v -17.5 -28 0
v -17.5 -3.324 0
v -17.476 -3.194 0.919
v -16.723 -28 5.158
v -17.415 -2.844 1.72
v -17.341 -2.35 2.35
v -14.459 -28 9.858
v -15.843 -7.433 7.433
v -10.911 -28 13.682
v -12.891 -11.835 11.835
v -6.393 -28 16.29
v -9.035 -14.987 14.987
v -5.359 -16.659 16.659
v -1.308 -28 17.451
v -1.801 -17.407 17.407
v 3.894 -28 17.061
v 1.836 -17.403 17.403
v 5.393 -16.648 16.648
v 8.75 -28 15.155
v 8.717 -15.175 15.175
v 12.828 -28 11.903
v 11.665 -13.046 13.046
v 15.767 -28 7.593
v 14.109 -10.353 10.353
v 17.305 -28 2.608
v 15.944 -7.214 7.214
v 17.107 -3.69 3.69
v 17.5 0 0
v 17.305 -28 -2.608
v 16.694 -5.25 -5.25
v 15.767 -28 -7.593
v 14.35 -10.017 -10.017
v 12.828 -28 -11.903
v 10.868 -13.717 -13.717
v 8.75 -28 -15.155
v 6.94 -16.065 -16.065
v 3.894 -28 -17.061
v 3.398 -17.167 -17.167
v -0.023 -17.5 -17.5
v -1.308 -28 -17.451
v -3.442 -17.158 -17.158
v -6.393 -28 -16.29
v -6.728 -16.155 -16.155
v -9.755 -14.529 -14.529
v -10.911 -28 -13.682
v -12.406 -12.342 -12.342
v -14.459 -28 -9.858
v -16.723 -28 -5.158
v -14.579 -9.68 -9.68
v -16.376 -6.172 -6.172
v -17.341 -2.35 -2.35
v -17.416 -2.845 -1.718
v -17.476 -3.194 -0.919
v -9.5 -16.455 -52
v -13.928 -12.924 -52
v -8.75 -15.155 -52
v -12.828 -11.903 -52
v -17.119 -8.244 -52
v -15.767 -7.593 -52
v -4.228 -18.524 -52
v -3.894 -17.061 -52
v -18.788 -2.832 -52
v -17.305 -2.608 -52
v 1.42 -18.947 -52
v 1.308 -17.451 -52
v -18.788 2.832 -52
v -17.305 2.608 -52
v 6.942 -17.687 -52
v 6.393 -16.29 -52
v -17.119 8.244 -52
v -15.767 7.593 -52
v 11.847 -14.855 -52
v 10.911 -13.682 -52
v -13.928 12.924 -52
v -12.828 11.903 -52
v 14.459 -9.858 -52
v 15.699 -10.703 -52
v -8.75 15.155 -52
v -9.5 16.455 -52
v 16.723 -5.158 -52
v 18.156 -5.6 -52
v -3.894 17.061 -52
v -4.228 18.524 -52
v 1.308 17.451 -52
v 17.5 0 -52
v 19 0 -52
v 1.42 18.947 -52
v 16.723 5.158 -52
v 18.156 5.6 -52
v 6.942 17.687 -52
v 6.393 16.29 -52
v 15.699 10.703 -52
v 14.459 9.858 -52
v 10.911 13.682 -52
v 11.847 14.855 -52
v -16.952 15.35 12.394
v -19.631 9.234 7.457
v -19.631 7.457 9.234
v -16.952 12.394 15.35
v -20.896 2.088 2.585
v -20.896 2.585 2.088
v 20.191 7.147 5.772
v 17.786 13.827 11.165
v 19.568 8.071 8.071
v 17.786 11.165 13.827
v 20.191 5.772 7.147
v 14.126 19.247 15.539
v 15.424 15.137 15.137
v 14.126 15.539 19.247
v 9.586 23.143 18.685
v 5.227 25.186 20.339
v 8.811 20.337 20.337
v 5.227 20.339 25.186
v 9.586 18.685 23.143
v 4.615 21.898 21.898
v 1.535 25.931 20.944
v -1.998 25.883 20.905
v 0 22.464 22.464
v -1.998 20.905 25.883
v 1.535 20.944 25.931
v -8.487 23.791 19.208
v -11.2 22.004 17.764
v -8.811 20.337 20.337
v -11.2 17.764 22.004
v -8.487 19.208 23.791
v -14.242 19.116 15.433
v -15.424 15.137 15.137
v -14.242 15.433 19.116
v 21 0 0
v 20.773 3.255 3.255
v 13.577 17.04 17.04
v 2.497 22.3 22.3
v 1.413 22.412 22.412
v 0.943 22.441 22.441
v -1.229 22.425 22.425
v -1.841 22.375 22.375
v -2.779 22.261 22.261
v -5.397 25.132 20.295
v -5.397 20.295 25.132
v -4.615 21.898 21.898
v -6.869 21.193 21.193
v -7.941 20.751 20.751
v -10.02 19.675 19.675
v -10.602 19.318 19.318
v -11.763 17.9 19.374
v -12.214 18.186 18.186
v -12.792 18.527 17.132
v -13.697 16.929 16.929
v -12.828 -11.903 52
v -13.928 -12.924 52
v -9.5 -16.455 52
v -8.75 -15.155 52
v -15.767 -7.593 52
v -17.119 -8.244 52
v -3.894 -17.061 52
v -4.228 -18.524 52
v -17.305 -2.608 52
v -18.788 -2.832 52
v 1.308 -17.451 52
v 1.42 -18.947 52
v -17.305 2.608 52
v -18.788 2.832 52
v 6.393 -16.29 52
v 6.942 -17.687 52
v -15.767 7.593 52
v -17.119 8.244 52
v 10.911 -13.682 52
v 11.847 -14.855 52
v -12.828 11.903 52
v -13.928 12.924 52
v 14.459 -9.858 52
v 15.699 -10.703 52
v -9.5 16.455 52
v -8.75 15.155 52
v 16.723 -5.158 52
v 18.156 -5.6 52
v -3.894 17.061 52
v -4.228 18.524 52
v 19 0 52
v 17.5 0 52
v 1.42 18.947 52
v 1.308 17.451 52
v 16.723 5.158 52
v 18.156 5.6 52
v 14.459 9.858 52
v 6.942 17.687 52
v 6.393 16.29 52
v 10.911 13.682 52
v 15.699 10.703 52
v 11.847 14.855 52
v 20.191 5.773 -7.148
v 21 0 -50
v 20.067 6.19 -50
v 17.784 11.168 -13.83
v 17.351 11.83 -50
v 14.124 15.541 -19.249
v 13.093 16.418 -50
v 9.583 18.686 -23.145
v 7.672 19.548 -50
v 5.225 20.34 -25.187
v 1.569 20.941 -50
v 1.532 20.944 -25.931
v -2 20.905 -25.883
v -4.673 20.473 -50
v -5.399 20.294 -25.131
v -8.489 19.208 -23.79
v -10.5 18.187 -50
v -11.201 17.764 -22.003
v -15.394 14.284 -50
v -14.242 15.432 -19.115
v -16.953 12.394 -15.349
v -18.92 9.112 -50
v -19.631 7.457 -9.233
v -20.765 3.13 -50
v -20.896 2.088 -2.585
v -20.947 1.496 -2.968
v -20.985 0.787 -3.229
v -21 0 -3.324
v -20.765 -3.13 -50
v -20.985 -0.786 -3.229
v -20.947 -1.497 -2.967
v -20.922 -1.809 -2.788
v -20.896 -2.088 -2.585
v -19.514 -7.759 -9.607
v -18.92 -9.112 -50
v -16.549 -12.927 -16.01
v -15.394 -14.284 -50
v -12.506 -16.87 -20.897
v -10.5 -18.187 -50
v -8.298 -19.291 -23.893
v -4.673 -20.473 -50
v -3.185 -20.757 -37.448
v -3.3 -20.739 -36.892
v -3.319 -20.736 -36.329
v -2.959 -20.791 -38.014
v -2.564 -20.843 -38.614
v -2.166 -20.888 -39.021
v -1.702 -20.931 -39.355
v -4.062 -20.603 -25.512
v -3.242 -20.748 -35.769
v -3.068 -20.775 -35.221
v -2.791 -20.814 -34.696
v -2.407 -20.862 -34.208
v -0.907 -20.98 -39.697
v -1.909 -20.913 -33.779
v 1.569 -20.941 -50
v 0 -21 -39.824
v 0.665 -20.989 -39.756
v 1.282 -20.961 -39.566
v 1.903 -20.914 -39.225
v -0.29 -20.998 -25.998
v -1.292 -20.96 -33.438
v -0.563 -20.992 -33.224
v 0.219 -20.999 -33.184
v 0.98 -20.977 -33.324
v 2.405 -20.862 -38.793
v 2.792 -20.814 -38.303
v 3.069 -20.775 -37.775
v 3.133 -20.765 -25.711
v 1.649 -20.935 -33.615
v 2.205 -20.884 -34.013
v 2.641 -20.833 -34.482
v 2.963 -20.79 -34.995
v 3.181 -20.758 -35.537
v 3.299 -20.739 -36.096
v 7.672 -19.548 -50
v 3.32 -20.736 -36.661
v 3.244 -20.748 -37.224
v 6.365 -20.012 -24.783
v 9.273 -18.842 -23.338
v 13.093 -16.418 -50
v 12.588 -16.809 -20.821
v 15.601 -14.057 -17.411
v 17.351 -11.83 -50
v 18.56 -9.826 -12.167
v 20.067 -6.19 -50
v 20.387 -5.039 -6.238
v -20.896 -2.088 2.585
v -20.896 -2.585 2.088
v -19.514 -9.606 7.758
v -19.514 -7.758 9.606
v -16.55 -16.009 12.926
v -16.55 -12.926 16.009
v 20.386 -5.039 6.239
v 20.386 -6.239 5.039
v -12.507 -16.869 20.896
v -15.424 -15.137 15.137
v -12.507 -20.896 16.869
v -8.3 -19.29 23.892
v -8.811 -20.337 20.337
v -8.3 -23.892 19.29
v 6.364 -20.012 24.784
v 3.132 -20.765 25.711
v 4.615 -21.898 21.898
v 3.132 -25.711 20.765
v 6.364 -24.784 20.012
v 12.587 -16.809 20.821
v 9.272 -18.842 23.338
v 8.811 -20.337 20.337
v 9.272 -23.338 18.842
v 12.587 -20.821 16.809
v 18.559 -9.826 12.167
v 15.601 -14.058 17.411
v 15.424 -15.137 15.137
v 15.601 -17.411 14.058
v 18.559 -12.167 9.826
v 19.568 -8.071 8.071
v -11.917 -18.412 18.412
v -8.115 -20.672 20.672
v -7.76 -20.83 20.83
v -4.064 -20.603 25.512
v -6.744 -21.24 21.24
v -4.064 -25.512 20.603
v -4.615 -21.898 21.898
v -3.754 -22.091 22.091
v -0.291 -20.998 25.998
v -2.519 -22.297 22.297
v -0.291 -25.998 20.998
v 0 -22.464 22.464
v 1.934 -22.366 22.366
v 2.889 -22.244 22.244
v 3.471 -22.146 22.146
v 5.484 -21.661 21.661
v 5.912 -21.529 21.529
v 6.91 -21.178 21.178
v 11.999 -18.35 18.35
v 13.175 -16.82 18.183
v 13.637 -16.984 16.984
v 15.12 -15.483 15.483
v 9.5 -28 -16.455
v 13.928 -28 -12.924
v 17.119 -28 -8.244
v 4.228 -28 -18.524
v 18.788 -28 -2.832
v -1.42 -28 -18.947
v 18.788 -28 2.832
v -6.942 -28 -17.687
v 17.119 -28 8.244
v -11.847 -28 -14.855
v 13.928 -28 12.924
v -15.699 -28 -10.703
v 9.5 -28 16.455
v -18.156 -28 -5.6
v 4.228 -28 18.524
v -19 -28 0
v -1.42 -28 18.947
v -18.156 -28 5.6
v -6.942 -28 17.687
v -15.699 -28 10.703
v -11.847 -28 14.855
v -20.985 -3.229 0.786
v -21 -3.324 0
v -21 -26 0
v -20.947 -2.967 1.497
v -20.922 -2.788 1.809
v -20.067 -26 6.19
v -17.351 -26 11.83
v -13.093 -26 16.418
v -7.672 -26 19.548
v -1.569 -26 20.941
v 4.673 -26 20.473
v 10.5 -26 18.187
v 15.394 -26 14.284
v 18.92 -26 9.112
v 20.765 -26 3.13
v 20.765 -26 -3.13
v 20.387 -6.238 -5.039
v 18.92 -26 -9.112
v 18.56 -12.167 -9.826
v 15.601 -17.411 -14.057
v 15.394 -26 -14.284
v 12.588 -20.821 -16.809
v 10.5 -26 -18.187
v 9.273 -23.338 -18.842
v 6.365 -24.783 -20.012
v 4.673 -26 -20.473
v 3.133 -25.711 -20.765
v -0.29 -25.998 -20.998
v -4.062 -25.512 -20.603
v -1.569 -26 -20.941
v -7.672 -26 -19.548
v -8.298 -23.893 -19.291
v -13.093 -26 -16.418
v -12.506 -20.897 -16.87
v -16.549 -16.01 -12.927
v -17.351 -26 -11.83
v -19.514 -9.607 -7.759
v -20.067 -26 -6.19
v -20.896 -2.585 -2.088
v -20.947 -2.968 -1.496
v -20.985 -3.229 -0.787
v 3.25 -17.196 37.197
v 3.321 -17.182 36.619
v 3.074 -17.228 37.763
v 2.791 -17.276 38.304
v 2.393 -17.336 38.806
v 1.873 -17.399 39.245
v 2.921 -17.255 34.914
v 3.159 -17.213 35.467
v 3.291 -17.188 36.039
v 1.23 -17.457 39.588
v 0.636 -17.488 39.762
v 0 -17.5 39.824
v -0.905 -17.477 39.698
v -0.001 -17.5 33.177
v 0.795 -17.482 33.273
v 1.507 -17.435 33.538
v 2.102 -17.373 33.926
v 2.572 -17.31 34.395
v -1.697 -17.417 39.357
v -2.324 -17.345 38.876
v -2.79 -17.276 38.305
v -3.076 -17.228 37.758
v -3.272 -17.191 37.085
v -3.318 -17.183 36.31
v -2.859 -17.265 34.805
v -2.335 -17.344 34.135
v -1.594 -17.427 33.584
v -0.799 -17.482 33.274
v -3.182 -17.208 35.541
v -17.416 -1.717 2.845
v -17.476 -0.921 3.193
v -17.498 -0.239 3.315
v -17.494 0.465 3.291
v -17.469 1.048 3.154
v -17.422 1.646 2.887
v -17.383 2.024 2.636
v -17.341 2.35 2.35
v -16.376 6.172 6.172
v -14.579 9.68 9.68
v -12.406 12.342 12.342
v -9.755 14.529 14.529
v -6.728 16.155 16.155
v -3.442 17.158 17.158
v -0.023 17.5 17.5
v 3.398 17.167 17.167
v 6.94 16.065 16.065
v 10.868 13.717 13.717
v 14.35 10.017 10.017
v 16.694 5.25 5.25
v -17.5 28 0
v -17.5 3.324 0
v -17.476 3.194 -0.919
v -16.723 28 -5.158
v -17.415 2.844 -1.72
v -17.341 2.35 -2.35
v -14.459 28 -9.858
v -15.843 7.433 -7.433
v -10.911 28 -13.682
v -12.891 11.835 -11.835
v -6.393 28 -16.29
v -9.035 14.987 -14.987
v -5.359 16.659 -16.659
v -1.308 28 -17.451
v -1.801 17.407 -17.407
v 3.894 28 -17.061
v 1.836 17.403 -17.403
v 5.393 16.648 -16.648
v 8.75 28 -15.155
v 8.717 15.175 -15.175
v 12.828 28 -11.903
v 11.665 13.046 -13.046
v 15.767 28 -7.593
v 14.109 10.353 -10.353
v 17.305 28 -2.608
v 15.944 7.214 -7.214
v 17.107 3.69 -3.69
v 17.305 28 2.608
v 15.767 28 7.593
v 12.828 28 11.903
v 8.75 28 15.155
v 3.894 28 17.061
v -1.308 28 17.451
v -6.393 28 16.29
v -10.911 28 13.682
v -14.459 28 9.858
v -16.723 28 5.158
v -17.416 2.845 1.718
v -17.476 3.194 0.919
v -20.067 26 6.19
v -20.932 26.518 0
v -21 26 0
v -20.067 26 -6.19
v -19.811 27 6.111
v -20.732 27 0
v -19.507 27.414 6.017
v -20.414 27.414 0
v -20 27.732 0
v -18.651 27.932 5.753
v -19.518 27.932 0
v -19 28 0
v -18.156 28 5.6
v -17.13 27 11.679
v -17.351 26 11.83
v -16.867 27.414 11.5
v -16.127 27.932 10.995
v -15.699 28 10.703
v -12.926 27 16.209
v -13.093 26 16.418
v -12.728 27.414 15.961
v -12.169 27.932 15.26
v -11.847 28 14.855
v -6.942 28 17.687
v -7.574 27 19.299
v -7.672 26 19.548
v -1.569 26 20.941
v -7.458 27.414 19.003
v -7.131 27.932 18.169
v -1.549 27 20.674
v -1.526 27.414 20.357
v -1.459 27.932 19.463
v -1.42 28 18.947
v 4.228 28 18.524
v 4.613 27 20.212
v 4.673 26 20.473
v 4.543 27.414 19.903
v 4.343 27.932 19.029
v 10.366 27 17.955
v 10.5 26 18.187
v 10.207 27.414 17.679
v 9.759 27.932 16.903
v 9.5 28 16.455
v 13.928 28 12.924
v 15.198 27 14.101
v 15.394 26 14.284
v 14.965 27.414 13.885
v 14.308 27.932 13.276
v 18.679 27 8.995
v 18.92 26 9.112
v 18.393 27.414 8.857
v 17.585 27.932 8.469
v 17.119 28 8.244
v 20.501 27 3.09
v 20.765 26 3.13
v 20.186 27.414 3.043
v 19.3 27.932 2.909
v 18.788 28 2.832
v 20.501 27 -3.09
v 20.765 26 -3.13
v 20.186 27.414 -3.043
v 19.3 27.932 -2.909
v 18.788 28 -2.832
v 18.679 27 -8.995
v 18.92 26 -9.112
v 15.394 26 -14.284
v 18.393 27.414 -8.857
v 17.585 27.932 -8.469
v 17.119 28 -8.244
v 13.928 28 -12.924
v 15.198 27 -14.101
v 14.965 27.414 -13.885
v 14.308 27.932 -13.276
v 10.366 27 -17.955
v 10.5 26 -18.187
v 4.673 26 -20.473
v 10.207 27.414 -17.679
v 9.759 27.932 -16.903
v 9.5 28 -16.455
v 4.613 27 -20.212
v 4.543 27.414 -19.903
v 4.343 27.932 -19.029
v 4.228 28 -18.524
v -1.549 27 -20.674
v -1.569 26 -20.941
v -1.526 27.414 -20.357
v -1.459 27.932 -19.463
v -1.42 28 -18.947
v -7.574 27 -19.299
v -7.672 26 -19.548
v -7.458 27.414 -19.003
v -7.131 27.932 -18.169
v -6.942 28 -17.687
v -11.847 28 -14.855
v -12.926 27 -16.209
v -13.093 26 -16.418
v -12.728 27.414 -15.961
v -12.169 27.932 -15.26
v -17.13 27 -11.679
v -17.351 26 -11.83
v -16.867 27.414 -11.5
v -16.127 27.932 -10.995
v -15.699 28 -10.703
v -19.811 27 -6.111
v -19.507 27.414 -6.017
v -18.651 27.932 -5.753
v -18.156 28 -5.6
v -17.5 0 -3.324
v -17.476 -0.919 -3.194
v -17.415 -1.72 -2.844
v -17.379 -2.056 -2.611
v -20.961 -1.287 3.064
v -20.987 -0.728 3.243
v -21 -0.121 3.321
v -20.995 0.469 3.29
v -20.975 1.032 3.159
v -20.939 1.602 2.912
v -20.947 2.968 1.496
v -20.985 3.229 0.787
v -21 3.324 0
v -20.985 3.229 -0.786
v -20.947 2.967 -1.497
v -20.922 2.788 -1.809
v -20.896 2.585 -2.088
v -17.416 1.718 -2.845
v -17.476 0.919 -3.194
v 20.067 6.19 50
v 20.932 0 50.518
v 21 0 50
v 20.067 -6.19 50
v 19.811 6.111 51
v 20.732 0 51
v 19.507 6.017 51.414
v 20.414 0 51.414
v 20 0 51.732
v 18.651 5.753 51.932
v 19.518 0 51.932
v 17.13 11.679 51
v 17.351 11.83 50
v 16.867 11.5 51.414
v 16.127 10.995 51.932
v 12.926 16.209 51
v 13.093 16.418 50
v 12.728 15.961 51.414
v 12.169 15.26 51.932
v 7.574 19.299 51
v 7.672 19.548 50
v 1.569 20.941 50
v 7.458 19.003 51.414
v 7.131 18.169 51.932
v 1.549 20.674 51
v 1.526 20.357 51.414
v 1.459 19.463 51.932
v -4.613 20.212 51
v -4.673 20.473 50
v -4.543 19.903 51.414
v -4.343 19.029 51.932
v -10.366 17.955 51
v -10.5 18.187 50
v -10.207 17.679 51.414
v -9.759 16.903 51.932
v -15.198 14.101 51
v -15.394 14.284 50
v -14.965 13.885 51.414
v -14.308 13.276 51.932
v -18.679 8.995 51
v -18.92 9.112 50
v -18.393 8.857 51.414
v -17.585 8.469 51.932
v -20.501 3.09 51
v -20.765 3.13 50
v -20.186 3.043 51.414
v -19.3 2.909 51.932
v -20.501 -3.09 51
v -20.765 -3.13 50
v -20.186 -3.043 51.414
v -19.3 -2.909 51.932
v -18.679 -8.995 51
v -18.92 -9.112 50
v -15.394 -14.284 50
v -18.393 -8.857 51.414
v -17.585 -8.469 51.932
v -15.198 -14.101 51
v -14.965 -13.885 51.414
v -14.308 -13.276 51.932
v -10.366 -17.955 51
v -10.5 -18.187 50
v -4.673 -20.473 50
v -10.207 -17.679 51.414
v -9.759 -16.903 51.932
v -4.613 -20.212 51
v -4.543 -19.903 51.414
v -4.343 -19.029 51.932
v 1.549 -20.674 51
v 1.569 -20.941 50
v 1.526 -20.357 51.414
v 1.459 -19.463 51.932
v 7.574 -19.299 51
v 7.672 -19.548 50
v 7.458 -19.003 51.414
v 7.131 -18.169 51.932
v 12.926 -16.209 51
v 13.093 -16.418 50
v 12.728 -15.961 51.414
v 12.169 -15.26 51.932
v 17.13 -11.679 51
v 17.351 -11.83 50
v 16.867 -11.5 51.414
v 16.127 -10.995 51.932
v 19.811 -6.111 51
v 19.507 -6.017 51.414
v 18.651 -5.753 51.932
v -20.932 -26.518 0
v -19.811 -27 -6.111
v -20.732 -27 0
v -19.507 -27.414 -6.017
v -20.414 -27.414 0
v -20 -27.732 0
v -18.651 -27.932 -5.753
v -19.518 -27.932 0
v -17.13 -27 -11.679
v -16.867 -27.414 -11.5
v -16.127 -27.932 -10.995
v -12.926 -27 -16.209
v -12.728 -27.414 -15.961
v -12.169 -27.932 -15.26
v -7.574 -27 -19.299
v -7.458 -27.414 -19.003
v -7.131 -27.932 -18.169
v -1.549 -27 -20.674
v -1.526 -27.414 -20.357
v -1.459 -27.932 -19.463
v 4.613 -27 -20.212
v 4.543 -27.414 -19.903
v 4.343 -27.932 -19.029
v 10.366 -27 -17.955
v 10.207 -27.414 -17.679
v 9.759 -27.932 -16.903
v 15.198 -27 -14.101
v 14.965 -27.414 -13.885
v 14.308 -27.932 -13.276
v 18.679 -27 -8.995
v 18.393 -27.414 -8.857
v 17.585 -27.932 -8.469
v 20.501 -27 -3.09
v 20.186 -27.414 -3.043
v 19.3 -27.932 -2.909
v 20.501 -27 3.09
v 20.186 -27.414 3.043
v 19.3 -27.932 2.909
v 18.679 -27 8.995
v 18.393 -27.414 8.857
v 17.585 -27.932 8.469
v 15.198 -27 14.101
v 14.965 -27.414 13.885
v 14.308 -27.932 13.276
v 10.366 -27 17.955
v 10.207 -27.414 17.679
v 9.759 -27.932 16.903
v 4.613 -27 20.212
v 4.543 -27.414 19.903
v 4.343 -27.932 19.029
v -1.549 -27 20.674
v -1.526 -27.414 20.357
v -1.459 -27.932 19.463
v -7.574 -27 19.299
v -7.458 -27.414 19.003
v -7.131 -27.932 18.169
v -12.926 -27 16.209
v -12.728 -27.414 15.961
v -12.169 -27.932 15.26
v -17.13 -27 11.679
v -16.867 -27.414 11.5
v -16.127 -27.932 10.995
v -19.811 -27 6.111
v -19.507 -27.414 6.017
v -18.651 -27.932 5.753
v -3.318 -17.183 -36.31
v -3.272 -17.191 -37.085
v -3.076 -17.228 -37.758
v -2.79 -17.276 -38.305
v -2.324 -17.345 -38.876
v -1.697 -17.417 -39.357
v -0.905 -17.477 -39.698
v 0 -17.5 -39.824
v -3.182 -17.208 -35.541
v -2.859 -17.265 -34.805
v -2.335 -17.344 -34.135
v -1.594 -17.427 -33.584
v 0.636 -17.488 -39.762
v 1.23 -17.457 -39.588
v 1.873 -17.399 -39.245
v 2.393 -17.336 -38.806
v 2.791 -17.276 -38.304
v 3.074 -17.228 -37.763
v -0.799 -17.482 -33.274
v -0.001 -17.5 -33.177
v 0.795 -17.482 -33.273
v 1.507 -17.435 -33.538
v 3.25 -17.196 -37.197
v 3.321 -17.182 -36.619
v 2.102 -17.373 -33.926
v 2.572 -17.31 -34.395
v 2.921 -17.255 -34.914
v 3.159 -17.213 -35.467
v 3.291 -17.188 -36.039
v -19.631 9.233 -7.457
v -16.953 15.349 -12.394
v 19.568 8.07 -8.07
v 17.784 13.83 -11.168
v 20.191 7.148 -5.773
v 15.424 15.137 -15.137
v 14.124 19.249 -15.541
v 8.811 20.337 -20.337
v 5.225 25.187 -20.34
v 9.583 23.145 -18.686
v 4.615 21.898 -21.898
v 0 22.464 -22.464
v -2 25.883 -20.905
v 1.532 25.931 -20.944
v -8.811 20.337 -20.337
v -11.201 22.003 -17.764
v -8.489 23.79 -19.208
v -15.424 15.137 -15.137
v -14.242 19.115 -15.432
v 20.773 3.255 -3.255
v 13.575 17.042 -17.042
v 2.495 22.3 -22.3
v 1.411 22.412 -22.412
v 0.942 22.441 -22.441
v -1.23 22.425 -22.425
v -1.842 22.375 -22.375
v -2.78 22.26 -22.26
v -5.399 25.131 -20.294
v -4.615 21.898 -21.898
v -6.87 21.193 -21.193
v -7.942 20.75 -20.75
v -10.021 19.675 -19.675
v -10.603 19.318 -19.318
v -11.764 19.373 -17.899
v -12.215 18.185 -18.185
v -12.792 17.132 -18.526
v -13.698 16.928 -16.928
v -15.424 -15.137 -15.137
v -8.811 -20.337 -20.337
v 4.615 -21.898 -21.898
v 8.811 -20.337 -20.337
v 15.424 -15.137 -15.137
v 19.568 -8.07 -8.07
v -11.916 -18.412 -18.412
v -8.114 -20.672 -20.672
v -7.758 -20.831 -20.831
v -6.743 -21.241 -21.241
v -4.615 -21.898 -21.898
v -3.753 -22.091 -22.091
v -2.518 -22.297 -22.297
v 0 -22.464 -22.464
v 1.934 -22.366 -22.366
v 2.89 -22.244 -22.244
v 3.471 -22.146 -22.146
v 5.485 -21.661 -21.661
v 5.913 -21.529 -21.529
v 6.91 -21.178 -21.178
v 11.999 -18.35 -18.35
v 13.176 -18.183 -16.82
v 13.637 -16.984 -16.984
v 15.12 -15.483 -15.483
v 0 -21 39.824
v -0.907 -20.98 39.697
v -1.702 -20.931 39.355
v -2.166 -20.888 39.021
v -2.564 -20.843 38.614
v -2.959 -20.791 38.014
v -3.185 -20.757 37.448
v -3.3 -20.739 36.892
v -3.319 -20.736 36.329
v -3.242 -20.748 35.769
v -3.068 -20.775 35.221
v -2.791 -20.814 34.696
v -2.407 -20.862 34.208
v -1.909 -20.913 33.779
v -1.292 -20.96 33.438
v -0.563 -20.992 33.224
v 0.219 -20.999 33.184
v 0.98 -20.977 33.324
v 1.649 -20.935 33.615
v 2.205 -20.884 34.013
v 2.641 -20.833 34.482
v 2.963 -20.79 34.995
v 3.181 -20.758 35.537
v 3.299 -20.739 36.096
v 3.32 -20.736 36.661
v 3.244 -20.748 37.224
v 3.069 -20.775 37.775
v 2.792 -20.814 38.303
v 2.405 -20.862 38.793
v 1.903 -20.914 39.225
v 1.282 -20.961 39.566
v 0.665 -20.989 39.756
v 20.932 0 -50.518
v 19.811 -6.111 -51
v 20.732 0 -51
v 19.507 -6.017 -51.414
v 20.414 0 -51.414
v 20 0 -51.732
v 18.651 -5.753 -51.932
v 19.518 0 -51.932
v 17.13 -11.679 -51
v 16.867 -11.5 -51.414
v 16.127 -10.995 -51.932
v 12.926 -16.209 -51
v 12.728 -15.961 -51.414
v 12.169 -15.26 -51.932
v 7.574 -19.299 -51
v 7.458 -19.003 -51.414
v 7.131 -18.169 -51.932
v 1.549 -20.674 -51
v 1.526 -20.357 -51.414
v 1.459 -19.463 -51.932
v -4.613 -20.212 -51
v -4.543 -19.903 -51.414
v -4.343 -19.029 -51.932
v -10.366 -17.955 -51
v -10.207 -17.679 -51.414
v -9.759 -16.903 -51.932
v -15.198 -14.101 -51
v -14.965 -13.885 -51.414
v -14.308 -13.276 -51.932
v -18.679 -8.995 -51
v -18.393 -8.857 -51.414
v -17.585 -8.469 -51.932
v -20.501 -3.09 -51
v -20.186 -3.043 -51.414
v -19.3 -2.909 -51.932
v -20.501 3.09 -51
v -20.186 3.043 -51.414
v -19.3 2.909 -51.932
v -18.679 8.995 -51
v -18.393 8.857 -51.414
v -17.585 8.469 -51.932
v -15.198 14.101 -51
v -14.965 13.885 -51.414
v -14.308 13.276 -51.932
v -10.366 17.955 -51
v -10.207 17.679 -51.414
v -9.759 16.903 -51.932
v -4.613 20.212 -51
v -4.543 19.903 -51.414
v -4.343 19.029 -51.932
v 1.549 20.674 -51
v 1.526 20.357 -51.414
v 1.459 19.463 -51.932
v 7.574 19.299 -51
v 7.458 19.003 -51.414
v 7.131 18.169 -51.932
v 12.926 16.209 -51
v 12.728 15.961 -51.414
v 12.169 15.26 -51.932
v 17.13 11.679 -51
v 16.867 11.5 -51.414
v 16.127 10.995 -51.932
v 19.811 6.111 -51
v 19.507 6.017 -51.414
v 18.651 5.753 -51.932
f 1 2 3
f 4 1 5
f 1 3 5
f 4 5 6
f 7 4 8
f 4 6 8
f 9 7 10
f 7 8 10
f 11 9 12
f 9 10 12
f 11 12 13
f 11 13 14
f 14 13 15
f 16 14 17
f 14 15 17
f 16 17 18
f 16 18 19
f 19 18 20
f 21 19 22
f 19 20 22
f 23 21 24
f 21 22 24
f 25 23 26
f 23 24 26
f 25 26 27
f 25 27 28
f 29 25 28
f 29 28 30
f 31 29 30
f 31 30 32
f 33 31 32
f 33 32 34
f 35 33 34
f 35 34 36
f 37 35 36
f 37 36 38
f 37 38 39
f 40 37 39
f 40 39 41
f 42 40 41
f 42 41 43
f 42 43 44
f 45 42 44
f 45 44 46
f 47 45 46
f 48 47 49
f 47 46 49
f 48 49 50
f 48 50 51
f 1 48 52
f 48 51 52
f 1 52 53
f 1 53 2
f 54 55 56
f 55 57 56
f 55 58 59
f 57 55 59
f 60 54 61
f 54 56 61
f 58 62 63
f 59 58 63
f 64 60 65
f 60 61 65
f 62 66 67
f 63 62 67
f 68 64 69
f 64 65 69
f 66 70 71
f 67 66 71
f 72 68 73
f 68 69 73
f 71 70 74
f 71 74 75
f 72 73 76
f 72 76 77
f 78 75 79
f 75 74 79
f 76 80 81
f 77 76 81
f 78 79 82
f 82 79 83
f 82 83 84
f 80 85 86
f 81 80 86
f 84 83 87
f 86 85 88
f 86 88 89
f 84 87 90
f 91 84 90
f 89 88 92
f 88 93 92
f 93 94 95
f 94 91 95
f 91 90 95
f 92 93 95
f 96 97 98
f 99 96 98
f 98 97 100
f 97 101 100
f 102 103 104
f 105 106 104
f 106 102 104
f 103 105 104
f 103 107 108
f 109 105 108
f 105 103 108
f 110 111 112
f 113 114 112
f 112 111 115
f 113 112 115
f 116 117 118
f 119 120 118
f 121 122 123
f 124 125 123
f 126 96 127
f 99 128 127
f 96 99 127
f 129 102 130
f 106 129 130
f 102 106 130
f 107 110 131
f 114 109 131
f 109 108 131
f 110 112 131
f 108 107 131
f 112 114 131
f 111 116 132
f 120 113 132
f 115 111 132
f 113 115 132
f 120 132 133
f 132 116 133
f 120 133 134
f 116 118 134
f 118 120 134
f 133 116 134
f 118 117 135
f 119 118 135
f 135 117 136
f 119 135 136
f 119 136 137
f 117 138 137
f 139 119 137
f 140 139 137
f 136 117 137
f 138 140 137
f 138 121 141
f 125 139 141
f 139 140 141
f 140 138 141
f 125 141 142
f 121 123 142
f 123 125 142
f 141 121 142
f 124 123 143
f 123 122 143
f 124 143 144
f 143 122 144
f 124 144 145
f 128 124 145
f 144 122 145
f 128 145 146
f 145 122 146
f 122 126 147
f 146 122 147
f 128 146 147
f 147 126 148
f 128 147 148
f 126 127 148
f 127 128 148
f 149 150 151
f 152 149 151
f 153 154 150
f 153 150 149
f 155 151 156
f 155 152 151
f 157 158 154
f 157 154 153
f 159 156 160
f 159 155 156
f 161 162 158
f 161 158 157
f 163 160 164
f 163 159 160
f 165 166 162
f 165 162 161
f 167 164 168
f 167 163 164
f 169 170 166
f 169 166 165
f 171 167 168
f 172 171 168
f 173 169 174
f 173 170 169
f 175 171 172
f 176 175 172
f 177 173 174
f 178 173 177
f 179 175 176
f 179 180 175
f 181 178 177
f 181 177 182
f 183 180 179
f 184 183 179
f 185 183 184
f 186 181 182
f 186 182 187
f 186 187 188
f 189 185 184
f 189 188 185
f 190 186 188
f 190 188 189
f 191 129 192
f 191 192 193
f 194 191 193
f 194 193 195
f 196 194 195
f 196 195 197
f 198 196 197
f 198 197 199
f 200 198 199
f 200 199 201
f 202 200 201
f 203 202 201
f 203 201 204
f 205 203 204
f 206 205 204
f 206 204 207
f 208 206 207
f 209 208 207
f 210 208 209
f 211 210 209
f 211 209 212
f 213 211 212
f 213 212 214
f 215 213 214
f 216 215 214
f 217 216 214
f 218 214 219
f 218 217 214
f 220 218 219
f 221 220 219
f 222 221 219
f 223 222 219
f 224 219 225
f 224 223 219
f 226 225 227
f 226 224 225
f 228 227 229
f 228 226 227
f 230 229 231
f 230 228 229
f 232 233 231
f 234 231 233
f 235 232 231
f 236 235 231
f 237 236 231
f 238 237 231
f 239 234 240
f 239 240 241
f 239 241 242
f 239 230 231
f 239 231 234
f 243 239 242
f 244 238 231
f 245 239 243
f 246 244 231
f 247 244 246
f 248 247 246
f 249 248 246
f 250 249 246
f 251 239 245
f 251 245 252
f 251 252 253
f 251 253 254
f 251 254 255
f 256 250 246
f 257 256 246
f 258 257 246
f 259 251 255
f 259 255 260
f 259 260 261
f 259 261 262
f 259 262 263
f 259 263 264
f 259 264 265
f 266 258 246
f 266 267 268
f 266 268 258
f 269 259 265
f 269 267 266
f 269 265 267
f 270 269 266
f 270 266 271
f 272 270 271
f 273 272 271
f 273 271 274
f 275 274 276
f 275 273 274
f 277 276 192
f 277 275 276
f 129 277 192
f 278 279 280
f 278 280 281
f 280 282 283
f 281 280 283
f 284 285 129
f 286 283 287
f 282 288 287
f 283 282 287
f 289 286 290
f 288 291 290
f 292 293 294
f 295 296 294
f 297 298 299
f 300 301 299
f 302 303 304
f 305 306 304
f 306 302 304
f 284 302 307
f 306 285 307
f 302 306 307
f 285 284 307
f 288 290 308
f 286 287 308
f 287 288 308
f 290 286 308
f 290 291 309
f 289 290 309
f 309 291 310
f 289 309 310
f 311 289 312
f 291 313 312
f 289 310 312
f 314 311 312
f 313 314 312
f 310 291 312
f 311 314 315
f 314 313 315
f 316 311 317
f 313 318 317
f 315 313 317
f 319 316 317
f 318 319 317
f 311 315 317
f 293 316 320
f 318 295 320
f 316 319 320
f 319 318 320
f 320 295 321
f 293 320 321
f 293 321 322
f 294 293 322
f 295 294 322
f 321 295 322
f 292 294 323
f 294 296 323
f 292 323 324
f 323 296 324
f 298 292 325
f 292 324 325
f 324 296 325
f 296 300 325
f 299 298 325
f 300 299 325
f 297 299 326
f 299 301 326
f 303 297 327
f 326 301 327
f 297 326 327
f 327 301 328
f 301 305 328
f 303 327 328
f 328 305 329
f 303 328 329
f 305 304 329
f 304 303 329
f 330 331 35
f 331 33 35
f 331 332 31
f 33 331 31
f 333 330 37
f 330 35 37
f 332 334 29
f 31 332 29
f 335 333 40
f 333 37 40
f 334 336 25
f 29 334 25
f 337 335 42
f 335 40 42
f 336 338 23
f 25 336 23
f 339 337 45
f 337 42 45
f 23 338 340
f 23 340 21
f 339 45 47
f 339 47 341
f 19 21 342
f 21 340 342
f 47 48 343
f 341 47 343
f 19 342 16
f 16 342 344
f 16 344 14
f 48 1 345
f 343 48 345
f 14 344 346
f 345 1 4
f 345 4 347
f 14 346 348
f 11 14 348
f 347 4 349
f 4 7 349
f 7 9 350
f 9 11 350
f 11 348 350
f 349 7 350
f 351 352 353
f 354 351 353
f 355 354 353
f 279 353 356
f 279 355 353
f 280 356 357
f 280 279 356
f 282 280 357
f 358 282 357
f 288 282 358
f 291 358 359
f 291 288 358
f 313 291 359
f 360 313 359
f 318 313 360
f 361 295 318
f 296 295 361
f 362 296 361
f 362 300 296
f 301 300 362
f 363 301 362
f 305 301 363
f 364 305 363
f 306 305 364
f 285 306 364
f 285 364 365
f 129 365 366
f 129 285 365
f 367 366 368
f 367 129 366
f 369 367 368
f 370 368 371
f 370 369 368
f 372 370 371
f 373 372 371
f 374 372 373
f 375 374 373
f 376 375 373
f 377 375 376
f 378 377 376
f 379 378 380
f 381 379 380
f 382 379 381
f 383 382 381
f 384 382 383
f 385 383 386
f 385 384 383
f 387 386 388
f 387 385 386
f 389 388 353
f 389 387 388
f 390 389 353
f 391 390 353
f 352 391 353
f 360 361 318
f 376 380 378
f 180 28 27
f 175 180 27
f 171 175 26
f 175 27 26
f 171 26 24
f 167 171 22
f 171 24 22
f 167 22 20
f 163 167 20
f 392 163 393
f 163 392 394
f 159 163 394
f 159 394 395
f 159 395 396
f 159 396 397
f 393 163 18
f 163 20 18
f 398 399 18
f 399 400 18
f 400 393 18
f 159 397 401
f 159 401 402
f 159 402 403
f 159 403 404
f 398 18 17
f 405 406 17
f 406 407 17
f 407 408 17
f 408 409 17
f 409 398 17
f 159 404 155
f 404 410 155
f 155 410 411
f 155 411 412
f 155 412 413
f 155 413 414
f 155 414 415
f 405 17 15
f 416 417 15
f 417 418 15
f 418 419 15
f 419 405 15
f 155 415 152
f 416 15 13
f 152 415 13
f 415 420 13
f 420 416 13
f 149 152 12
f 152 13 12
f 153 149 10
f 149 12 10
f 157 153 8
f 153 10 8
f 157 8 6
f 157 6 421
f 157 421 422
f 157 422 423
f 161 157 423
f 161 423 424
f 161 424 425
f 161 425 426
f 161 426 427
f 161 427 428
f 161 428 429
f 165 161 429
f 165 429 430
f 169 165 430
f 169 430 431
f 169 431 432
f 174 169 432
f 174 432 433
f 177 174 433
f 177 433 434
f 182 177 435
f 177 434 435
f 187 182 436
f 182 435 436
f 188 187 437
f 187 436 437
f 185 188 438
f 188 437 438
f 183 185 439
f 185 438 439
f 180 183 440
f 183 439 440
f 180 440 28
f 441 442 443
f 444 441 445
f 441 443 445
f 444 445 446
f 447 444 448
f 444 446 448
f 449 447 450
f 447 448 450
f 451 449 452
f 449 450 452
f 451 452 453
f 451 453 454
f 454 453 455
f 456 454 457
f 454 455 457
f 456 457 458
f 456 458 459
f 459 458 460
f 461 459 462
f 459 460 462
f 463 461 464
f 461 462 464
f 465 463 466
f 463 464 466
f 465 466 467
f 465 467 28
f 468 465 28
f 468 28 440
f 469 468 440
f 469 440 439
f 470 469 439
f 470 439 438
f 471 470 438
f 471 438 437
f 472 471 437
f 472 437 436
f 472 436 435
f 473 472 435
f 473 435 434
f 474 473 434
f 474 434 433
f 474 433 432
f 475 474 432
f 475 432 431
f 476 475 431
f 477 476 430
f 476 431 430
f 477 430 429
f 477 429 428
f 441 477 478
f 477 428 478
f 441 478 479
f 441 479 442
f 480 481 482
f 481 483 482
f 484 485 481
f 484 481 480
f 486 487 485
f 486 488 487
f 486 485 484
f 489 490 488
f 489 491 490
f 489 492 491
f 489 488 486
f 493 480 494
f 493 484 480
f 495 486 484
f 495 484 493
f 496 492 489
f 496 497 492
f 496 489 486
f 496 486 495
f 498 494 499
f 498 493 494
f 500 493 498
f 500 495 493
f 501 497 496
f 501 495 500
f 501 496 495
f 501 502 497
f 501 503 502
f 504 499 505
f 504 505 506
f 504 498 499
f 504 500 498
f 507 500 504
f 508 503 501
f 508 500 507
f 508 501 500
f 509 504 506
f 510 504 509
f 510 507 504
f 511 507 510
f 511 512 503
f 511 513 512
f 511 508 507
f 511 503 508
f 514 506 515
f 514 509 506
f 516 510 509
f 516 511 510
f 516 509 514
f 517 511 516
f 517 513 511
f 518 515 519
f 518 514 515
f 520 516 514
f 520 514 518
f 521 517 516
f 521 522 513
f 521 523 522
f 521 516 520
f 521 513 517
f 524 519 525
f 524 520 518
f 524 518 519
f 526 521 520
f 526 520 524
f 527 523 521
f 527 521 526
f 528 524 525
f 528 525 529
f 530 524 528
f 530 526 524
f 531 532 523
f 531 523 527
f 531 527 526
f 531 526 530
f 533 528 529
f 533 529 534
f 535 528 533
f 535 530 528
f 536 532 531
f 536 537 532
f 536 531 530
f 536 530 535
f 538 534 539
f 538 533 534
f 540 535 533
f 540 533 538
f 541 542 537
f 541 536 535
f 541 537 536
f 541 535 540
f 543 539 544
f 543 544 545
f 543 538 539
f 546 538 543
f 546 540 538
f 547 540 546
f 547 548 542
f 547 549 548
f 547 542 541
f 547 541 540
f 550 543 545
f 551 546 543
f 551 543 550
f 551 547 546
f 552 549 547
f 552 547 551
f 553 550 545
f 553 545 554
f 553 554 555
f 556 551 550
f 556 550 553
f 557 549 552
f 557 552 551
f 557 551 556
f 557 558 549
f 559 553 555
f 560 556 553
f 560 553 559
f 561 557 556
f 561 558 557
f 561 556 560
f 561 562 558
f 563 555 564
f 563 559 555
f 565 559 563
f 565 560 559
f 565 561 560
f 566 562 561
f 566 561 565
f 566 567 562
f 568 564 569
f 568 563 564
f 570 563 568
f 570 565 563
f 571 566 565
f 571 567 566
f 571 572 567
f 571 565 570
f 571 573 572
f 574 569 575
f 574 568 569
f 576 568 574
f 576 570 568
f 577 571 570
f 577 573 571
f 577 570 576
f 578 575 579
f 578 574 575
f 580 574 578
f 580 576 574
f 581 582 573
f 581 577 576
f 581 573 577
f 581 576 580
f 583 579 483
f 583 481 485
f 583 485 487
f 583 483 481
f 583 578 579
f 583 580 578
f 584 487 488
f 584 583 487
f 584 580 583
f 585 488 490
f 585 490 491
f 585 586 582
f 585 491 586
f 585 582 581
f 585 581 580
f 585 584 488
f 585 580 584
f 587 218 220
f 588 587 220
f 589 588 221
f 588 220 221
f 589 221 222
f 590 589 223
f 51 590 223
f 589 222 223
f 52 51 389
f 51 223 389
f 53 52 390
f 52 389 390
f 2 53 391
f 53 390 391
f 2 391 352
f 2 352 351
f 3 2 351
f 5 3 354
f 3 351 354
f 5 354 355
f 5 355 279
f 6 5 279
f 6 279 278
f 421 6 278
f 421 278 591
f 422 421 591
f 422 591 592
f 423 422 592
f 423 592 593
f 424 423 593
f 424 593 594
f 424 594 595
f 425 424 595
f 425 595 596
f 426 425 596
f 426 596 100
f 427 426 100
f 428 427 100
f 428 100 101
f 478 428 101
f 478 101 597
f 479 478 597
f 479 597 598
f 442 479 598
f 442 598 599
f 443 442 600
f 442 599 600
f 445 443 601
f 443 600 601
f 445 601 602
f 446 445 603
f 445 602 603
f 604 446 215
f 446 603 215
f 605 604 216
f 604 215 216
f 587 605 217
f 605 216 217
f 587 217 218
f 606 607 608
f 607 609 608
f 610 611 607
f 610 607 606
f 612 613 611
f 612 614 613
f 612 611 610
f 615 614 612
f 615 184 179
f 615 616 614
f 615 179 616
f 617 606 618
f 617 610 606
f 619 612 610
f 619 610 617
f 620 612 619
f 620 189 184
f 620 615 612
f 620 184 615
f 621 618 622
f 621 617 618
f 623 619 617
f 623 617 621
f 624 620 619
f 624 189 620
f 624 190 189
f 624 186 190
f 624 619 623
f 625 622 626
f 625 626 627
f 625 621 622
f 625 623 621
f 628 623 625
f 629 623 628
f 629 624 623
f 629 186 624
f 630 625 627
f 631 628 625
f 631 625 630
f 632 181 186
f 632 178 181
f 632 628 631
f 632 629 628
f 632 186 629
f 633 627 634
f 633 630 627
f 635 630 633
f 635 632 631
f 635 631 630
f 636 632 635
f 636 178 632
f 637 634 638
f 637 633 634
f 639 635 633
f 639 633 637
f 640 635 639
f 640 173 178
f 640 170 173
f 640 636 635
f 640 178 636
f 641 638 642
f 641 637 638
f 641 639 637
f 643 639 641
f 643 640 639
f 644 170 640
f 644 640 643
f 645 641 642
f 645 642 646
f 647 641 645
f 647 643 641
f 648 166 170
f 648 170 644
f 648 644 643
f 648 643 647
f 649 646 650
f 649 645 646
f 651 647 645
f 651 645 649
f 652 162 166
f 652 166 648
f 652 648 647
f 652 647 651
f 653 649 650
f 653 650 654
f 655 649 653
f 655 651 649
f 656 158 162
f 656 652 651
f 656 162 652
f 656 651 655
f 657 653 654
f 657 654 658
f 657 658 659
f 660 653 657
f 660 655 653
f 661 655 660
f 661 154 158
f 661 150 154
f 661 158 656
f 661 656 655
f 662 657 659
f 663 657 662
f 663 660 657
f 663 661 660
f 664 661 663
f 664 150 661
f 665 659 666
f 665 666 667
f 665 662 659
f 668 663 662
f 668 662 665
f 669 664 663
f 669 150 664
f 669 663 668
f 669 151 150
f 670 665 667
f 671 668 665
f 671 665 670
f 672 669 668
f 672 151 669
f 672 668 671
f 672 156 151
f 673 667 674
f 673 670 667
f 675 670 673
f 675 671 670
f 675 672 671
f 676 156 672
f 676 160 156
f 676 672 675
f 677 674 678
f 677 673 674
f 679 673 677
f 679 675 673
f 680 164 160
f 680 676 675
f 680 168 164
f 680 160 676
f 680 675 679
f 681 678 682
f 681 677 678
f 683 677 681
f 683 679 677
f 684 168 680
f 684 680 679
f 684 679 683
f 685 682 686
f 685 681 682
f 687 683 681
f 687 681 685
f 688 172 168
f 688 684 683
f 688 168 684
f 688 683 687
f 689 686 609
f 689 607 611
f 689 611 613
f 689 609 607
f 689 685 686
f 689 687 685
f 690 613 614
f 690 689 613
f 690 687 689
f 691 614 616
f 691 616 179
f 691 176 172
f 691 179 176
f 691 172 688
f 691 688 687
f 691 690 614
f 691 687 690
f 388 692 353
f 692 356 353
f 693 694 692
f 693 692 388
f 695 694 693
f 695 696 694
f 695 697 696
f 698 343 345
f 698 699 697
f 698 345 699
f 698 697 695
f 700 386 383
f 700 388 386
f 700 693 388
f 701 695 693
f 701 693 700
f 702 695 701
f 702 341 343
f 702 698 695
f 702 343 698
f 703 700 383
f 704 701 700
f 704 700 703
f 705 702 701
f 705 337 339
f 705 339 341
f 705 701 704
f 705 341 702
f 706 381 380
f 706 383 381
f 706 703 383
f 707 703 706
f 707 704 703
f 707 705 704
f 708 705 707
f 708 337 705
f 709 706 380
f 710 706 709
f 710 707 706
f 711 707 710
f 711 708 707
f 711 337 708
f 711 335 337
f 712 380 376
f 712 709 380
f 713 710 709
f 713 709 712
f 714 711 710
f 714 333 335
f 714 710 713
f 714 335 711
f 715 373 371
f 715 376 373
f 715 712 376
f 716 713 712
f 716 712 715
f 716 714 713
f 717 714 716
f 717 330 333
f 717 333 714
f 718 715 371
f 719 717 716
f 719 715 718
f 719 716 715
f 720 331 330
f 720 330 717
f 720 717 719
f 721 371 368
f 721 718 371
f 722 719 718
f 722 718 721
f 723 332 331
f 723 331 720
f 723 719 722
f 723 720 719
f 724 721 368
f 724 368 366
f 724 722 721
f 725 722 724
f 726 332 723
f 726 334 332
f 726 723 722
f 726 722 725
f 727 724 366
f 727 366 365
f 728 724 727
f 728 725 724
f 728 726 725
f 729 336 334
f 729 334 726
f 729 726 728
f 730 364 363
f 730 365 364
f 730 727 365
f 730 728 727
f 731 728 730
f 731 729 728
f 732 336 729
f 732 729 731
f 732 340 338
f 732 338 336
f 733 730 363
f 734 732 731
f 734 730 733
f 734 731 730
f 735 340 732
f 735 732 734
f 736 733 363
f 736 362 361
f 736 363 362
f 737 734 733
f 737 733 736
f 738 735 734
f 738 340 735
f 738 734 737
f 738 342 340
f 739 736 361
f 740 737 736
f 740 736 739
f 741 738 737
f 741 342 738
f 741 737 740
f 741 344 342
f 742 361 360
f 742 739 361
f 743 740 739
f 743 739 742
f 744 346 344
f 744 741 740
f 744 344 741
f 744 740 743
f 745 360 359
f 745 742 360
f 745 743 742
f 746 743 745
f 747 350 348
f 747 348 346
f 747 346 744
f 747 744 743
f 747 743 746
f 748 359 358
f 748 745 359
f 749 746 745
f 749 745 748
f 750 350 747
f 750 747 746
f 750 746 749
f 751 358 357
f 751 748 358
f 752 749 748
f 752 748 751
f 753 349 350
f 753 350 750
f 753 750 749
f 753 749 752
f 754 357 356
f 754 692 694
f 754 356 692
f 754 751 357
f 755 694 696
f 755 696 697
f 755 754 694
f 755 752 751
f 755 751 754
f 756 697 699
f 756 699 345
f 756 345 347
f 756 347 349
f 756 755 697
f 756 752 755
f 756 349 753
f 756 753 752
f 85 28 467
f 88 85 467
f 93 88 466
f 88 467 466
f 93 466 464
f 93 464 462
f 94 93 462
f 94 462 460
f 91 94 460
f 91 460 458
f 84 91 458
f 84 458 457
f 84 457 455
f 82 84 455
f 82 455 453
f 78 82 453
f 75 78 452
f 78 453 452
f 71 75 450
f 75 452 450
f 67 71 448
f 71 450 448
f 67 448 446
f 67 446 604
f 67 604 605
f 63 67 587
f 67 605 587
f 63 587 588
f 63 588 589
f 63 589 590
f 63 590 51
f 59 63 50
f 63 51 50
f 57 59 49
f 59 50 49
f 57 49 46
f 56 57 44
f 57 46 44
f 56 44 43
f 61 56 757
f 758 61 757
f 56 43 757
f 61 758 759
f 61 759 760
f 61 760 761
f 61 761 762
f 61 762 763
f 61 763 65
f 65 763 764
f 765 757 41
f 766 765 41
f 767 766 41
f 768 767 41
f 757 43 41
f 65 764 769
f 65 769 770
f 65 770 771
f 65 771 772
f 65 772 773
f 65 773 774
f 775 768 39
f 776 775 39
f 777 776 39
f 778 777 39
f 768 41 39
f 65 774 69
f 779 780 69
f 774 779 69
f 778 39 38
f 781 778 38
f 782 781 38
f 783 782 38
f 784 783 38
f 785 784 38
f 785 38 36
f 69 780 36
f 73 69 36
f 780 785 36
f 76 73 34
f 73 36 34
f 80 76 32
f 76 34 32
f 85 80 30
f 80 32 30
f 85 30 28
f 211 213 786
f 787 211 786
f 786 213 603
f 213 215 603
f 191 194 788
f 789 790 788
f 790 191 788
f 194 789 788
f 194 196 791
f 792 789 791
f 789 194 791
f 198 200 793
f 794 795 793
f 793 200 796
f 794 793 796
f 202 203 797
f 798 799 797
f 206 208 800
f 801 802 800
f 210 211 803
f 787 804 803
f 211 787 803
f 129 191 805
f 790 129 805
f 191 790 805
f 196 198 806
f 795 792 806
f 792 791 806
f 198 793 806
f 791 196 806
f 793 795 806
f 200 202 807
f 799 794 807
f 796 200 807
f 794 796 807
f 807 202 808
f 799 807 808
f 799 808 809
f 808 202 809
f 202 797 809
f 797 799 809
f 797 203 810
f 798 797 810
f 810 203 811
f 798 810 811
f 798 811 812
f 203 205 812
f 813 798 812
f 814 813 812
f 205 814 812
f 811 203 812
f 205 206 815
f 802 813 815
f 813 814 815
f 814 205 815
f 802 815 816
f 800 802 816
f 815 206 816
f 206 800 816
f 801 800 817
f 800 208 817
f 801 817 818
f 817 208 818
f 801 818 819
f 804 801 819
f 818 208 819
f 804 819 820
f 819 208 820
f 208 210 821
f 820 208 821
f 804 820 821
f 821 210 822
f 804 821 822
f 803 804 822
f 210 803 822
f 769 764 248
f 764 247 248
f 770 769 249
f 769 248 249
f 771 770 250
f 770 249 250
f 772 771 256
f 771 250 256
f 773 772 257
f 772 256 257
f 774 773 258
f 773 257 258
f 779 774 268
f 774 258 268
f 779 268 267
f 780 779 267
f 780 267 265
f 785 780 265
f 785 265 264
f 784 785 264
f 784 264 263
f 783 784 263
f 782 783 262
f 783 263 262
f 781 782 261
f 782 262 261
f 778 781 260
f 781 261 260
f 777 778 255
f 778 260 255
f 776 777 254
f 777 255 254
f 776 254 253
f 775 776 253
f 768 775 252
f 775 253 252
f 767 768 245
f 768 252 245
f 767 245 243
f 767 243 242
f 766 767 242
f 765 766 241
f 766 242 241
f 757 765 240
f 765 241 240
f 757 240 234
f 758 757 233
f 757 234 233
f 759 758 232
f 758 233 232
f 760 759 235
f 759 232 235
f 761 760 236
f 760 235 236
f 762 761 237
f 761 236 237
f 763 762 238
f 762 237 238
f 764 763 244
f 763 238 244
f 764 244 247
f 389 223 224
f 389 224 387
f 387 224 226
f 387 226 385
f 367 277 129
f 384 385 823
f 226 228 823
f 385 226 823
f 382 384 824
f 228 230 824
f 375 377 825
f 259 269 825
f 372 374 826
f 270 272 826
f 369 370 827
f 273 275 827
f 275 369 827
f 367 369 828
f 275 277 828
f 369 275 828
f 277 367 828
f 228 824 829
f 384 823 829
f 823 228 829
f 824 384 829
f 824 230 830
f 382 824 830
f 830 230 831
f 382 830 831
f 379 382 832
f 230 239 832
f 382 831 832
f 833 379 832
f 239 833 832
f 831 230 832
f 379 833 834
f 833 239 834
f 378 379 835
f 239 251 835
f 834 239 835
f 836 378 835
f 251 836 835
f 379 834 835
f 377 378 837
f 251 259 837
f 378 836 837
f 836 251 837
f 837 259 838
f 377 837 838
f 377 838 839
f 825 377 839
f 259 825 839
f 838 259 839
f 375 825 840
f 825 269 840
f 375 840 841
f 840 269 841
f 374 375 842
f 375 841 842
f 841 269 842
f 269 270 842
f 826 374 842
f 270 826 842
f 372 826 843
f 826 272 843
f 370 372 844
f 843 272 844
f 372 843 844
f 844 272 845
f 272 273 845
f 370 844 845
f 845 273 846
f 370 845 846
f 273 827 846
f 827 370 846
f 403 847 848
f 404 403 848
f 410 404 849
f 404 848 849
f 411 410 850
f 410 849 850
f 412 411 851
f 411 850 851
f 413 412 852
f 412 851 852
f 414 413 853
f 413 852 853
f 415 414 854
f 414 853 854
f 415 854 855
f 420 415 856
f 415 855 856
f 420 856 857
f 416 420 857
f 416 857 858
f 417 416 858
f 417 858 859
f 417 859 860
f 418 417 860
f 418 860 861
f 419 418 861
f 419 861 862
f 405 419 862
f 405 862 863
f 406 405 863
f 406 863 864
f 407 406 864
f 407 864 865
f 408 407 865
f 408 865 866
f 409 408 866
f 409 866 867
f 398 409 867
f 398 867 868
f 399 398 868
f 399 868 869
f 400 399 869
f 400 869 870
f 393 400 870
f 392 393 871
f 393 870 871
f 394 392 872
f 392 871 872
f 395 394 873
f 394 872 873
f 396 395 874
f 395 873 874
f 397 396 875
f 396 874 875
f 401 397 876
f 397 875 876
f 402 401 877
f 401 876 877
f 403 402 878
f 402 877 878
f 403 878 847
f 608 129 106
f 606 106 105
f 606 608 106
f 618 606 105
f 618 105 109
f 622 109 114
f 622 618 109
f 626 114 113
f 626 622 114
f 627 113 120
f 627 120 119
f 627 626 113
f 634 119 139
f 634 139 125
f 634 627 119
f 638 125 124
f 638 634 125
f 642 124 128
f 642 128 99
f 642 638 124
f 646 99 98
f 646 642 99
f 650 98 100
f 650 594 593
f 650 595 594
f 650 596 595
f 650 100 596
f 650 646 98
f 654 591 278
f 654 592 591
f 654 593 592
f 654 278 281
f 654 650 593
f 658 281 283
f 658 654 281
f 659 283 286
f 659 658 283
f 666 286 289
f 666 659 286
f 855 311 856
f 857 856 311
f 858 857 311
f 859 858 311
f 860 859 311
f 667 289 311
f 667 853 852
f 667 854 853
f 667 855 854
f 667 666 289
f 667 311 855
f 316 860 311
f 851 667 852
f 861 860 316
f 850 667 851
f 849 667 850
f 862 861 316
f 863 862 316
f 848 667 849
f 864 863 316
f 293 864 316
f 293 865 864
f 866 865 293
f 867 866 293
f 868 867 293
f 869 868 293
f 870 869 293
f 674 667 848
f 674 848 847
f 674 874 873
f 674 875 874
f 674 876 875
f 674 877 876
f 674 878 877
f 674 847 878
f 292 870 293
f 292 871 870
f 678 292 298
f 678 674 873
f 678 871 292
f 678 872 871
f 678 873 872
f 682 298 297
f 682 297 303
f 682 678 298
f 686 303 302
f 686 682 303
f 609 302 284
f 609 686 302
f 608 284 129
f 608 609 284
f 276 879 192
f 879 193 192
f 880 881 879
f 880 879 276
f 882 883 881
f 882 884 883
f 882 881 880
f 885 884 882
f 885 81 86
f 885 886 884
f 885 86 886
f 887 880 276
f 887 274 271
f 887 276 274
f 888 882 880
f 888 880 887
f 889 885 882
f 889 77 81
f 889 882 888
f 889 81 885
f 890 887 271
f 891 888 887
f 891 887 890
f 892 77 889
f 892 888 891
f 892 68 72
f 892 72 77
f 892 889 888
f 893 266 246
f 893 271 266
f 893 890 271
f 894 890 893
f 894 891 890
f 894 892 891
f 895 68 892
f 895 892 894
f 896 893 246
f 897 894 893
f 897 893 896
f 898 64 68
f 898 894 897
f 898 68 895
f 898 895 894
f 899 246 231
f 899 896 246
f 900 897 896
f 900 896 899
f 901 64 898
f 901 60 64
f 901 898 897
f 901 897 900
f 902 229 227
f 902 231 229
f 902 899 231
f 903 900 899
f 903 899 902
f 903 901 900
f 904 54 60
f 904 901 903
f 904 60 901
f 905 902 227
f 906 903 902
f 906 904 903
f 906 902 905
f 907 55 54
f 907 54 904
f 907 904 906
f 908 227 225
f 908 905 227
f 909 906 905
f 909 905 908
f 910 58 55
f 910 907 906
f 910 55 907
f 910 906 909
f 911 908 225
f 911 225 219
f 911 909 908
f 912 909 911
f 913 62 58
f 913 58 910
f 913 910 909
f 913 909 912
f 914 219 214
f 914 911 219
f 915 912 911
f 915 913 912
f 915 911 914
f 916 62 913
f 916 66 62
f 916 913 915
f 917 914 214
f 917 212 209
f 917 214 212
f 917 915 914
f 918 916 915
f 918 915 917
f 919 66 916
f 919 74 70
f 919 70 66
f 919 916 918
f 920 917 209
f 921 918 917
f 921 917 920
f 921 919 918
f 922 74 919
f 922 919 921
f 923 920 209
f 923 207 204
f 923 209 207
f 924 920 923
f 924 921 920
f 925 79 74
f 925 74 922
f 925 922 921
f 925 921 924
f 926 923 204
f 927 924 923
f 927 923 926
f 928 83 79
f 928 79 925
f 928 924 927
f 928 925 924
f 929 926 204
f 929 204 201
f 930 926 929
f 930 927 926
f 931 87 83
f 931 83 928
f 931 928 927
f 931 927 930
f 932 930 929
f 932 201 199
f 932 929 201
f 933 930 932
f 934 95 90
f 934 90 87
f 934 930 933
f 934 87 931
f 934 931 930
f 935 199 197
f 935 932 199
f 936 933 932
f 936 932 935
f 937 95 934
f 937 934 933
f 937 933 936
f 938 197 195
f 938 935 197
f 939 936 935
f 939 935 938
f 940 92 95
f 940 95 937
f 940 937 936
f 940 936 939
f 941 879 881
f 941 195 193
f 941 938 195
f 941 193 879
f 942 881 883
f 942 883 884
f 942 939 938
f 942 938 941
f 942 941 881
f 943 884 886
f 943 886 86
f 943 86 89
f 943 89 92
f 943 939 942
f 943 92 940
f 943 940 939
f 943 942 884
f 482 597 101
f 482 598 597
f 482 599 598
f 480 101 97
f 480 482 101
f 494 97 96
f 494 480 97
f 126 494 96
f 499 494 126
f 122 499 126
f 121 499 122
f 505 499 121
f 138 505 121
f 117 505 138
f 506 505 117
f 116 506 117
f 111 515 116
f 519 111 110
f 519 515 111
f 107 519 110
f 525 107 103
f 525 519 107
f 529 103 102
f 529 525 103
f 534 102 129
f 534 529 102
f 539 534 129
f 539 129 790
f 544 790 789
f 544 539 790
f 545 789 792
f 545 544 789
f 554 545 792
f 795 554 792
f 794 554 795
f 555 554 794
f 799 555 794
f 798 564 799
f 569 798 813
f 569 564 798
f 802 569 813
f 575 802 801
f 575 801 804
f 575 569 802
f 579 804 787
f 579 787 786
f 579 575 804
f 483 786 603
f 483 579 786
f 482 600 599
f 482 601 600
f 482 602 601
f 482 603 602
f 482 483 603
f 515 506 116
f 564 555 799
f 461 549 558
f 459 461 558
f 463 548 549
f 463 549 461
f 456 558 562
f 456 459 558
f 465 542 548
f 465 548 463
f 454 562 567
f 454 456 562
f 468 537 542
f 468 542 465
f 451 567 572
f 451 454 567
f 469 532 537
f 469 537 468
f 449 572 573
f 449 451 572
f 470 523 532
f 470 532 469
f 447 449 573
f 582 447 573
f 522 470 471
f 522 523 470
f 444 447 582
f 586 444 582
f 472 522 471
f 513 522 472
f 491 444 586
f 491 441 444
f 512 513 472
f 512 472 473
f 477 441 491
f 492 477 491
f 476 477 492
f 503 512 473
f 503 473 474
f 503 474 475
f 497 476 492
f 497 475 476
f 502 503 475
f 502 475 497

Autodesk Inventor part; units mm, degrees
ref_plane "XY Plane" through (0, 0, 0) normal (0, 0, 1) x (1, 0, 0)
sketch "Sketch1" plane through (0, 0, 0) normal (0, 0, 1) x (1, 0, 0)
  circle A0 centre (0, 0) radius 17.5
  circle A1 centre (0, 0) radius 21
  dimension "d1" = 42
  dimension "d2" = 35
extrude "Extrusion1" add sketch "Sketch1" along normal mid plane 104 contours A0 | A1
sketch "Sketch2" plane through (0, 0, 0) normal (0, 1, 0) x (-1, 0, 0)
  circle A0 centre (0, 0) radius 17.5
  circle A1 centre (0, 0) radius 21
  dimension "d5" = 35
  dimension "d6" = 42
extrude "Extrusion2" add sketch "Sketch2" along normal mid plane 56 contours A0 | A1
extrude "Extrusion3" cut sketch "Sketch2" along normal through all both and the other way through all contours A0
extrude "Extrusion4" cut sketch "Sketch1" along normal through all both and the other way through all contours A0
fillet "Fillet1" radius 5 4 edges at (0, 21, 21) (0, -21, 21) (0, 21, -21) (0, -21, -21)
hole "Hole1" at (0, 0, 0) direction (-1, 0, 0) diameter 6.647 end through all thread size "M8x1.25" class "6H" standard "ISO Metric profile"
ref_plane "Work Plane1" through (0, 0, 36.5) normal (0, 0, 1) x (1, 0, 0)
hole "Hole2" at (0, 0, 36.5) direction (0, -1, 0) diameter 6.647 end through all thread size "M8x1.25" class "6H" standard "ISO Metric profile"
mirror "Mirror1" about plane through (0, 0, 0) normal (0, 0, 1) of "Hole2"
fillet "Fillet2" radius 2 4 edges at (-21, 0, 52) (21, 28, 0) (21, -28, 0) (-21, 0, -52)
equation "\"d5\" = d2"
equation "\"d6\" = d1"
equation "\"d23\" = -0.25 * d3 + 0.25 * d1"
equation "\"d3\" = 104"
properties part number "L26-6"
